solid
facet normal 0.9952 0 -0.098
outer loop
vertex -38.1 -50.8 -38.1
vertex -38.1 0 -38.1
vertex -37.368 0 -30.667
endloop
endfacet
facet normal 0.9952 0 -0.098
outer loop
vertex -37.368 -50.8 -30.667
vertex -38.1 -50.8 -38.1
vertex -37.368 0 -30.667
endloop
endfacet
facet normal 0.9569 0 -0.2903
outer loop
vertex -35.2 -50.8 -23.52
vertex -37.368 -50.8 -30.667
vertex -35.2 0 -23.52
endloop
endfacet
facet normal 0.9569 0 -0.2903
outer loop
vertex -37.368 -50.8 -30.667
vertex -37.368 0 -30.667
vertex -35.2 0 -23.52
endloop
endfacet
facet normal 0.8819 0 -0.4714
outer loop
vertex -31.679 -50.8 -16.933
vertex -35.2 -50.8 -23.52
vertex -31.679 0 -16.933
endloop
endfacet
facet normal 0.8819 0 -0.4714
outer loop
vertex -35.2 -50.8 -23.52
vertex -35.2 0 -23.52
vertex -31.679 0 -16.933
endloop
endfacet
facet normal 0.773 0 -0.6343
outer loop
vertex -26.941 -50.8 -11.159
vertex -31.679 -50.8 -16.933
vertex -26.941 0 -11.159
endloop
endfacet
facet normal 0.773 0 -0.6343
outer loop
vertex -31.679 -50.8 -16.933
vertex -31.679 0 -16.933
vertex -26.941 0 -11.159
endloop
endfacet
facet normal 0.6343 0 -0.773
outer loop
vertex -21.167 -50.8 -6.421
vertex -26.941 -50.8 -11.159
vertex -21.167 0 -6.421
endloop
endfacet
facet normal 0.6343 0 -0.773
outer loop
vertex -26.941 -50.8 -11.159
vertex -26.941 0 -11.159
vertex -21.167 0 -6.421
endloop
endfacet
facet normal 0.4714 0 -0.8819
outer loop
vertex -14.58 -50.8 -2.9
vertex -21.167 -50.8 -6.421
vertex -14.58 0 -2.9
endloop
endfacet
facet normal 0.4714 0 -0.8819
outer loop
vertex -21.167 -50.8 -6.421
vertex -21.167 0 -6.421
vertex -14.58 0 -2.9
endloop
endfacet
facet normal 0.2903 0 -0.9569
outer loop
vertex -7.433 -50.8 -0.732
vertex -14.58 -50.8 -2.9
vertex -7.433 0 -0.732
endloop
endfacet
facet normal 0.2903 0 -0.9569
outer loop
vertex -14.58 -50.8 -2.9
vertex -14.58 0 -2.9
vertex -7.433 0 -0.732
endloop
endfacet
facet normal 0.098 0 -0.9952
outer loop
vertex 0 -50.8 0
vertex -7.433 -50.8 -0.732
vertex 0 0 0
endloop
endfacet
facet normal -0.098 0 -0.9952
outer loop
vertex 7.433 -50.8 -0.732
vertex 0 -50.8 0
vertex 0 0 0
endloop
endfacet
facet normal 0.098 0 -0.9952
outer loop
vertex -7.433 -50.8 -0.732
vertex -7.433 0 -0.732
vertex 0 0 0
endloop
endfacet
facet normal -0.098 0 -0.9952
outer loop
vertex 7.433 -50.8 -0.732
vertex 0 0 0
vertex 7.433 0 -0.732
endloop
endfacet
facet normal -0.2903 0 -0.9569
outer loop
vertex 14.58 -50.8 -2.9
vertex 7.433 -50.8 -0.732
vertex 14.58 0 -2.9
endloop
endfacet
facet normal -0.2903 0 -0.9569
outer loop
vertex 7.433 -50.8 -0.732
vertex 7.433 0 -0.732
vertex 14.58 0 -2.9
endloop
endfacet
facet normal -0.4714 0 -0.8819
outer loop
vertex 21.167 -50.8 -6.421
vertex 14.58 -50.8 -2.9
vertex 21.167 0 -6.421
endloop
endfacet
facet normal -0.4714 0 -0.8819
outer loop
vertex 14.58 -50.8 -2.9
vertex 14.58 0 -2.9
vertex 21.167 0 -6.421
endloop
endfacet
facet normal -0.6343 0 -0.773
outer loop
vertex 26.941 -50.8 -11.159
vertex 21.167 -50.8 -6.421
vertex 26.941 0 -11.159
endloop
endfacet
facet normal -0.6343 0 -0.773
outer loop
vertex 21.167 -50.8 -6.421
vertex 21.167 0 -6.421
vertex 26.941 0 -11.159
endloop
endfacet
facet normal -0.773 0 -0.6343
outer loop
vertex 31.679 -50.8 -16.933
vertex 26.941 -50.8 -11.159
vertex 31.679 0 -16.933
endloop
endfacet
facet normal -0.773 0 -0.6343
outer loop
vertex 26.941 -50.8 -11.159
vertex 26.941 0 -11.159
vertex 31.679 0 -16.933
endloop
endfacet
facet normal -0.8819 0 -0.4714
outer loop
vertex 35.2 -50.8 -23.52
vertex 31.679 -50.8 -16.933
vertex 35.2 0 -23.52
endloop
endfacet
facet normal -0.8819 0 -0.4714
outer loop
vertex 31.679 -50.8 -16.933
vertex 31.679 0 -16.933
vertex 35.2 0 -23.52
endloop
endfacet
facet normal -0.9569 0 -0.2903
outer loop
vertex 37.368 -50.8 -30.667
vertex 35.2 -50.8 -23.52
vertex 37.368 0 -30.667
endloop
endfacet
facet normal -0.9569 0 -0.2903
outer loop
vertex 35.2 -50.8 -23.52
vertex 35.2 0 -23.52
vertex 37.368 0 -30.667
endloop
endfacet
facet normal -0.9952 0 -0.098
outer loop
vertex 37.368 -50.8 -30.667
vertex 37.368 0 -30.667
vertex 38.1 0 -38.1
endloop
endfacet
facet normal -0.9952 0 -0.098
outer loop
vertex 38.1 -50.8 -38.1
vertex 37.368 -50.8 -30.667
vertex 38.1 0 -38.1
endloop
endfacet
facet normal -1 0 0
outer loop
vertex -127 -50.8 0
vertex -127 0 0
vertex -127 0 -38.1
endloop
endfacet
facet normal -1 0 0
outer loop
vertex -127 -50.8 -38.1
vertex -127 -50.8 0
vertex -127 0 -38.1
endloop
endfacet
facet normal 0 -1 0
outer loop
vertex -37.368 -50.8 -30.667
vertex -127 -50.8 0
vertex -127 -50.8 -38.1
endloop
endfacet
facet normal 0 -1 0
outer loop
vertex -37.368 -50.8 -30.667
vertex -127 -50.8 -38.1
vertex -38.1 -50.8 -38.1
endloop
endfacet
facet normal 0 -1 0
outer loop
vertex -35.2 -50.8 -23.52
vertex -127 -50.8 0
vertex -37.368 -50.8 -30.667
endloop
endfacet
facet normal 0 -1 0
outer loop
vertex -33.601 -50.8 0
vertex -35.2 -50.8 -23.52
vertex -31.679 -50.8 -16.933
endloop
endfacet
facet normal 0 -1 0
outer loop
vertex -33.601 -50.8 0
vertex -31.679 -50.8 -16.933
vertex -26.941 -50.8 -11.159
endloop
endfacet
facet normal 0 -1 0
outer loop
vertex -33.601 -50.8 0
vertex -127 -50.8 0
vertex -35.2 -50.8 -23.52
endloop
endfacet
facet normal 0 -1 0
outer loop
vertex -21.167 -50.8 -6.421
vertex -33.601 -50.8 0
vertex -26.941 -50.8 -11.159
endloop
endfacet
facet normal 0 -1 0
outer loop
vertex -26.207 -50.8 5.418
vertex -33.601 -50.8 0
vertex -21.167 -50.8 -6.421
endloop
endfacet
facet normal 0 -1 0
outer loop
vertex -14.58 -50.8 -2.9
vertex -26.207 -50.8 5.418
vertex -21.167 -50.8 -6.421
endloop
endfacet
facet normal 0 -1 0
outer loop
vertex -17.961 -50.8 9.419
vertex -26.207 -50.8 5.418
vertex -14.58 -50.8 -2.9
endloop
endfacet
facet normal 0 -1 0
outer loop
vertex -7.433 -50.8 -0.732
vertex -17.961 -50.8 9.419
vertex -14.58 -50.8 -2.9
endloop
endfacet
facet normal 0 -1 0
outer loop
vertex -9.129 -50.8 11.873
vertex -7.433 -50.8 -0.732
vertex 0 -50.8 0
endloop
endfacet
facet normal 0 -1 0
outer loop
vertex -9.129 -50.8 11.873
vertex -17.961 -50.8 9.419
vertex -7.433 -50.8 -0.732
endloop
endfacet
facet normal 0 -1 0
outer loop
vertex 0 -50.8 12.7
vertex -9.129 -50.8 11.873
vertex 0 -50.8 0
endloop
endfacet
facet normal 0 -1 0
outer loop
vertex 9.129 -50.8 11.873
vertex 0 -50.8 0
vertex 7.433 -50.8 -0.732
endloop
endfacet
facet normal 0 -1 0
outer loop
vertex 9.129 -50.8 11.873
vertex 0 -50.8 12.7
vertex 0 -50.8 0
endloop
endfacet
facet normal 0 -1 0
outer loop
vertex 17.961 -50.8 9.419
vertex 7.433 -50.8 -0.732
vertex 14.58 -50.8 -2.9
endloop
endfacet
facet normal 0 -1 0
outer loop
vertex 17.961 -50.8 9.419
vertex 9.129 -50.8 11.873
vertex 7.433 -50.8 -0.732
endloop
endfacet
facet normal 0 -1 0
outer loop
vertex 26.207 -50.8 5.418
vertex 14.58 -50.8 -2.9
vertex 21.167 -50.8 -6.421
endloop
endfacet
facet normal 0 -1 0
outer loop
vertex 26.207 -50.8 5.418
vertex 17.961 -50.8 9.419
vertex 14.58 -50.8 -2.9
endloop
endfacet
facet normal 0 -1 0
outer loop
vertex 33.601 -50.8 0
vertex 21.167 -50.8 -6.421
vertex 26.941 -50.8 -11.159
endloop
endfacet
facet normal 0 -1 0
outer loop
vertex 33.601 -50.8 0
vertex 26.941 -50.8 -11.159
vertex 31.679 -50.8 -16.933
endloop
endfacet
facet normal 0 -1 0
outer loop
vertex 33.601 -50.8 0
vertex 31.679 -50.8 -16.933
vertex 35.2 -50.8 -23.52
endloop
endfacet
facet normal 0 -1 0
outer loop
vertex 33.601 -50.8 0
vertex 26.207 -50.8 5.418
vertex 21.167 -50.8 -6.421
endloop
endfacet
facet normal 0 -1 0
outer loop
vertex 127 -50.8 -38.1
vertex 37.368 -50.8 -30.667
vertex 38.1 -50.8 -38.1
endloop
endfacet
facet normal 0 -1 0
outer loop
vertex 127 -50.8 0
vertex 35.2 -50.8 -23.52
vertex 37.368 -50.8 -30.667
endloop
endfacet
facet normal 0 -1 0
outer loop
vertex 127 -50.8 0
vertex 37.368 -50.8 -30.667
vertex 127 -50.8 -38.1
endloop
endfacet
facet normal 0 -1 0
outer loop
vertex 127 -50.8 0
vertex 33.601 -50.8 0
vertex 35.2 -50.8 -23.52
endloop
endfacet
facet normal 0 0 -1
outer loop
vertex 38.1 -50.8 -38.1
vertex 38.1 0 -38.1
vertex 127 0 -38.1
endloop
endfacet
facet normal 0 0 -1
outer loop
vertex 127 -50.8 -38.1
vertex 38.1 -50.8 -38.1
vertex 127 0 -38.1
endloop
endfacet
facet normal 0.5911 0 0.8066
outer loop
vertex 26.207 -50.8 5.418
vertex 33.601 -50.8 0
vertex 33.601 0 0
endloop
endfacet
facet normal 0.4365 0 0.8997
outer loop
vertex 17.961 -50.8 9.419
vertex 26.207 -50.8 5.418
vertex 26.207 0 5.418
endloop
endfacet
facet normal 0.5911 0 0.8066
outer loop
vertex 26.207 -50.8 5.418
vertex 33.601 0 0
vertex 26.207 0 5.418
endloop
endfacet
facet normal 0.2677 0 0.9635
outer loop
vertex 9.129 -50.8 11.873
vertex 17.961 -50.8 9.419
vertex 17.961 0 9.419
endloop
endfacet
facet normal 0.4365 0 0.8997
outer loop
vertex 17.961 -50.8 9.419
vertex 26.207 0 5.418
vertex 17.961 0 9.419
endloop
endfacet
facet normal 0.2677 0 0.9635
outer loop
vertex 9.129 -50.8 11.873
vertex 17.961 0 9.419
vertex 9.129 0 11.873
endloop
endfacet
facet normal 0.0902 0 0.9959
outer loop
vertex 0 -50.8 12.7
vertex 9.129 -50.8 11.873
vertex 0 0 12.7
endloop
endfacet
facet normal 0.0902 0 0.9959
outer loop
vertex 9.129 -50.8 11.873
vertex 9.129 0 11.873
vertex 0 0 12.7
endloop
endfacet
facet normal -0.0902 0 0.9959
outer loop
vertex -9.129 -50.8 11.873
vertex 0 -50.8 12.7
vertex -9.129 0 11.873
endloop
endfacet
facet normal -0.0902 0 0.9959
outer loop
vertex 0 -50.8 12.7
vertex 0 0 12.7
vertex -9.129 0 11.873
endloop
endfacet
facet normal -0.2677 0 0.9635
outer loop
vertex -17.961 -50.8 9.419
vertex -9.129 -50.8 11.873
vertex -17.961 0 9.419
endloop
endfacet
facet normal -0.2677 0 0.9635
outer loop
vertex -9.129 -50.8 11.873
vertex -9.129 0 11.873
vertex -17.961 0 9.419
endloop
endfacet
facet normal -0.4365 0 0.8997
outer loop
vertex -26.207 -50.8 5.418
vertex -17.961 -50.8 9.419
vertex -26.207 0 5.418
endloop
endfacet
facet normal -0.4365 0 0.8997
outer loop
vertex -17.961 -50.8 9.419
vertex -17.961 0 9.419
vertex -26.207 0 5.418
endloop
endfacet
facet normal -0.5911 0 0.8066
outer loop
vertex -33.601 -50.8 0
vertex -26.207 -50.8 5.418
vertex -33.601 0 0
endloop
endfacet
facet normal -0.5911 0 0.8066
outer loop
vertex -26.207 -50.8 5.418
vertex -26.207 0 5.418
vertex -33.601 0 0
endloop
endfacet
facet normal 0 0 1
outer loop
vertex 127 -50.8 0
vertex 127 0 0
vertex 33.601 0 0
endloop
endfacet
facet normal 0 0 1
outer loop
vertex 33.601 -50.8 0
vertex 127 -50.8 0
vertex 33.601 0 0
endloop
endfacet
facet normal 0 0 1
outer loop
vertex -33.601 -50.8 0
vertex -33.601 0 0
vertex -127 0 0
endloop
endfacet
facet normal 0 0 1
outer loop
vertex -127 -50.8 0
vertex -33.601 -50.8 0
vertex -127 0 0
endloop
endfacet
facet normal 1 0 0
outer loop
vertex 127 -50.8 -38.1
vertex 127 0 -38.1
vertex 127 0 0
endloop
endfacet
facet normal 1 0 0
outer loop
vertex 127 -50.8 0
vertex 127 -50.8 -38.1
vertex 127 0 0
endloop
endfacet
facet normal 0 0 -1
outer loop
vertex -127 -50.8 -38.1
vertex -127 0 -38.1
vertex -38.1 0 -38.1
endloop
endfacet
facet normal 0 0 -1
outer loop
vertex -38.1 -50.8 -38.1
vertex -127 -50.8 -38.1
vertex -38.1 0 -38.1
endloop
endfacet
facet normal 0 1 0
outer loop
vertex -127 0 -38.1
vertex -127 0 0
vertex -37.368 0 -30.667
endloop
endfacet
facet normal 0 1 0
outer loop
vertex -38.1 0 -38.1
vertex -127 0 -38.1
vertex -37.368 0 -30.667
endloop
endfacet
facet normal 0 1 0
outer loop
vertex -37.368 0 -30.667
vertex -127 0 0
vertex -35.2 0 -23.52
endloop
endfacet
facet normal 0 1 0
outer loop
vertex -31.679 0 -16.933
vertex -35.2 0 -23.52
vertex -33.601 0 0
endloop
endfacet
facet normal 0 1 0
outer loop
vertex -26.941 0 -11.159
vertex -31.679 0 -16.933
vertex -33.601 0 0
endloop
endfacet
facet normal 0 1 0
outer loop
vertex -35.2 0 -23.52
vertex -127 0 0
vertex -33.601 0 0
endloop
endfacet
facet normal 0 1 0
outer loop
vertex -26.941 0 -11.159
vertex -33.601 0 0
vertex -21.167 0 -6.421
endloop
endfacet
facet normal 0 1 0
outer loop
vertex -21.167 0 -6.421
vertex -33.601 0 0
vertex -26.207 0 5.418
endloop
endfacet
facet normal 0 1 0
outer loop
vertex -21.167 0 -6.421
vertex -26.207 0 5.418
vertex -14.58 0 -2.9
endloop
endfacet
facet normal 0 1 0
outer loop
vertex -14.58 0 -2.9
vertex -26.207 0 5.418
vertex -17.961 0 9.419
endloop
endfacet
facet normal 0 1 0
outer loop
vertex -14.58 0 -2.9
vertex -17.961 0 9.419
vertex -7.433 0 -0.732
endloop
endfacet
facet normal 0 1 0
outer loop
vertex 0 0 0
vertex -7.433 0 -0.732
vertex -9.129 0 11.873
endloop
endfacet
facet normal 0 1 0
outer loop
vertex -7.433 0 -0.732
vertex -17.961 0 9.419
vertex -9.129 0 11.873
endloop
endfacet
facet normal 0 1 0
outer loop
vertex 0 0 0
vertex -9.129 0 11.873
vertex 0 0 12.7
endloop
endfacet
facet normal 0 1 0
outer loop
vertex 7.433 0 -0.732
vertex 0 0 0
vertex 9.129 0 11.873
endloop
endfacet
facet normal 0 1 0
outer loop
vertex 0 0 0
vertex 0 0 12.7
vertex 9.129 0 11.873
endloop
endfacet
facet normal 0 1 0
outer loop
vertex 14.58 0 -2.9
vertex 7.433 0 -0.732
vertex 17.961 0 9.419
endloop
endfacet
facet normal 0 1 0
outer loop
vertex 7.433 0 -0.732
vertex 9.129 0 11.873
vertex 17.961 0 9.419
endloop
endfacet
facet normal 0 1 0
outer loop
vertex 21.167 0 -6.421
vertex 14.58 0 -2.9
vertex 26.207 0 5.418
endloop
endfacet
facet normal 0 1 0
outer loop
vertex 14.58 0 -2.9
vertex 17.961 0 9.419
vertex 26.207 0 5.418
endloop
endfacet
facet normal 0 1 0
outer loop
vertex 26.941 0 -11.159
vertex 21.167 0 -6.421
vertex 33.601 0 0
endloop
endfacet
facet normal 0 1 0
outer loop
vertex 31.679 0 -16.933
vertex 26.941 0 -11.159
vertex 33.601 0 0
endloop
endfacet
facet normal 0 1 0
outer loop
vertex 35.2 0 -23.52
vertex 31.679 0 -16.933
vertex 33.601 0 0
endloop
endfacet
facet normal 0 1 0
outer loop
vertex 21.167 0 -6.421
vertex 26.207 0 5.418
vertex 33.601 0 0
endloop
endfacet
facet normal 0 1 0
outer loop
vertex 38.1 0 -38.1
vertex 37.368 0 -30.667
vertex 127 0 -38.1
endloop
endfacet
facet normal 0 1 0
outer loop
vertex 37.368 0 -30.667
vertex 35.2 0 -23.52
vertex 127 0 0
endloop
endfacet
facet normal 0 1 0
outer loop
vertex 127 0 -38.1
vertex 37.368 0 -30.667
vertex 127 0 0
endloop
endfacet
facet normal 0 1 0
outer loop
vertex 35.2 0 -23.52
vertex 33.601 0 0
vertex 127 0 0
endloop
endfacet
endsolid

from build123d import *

# Parameters (mm, degrees)
F1_DEPTH = 50.8


with BuildPart() as f1:
    # F0 (on Front) → F1 (new body)
    with BuildSketch(Plane.XZ):
        with BuildLine():
            Line((-127, 0), (-127, -38.1))
            Line((-127, -38.1), (-50.8, -38.1))
            ThreePointArc((-50.8, -38.1), (-46.301042, -17.198958), (-33.601042, 0))
            Line((-33.601042, 0), (-127, 0))
        make_face()
        with BuildLine():
            Line((127, 0), (33.601042, 0))
            ThreePointArc((33.601042, 0), (46.301042, -17.198958), (50.8, -38.1))
            Line((50.8, -38.1), (127, -38.1))
            Line((127, -38.1), (127, 0))
        make_face()
        with BuildLine():
            ThreePointArc((-33.601042, 0), (-46.301042, -17.198958), (-50.8, -38.1))
            Line((-50.8, -38.1), (-38.1, -38.1))
            ThreePointArc((-38.1, -38.1), (0, 0), (38.1, -38.1))
            Line((38.1, -38.1), (50.8, -38.1))
            ThreePointArc((50.8, -38.1), (46.301042, -17.198958), (33.601042, 0))
            ThreePointArc((33.601042, 0), (0, 12.7), (-33.601042, 0))
        make_face()
    extrude(amount=F1_DEPTH)


solid = f1.part
